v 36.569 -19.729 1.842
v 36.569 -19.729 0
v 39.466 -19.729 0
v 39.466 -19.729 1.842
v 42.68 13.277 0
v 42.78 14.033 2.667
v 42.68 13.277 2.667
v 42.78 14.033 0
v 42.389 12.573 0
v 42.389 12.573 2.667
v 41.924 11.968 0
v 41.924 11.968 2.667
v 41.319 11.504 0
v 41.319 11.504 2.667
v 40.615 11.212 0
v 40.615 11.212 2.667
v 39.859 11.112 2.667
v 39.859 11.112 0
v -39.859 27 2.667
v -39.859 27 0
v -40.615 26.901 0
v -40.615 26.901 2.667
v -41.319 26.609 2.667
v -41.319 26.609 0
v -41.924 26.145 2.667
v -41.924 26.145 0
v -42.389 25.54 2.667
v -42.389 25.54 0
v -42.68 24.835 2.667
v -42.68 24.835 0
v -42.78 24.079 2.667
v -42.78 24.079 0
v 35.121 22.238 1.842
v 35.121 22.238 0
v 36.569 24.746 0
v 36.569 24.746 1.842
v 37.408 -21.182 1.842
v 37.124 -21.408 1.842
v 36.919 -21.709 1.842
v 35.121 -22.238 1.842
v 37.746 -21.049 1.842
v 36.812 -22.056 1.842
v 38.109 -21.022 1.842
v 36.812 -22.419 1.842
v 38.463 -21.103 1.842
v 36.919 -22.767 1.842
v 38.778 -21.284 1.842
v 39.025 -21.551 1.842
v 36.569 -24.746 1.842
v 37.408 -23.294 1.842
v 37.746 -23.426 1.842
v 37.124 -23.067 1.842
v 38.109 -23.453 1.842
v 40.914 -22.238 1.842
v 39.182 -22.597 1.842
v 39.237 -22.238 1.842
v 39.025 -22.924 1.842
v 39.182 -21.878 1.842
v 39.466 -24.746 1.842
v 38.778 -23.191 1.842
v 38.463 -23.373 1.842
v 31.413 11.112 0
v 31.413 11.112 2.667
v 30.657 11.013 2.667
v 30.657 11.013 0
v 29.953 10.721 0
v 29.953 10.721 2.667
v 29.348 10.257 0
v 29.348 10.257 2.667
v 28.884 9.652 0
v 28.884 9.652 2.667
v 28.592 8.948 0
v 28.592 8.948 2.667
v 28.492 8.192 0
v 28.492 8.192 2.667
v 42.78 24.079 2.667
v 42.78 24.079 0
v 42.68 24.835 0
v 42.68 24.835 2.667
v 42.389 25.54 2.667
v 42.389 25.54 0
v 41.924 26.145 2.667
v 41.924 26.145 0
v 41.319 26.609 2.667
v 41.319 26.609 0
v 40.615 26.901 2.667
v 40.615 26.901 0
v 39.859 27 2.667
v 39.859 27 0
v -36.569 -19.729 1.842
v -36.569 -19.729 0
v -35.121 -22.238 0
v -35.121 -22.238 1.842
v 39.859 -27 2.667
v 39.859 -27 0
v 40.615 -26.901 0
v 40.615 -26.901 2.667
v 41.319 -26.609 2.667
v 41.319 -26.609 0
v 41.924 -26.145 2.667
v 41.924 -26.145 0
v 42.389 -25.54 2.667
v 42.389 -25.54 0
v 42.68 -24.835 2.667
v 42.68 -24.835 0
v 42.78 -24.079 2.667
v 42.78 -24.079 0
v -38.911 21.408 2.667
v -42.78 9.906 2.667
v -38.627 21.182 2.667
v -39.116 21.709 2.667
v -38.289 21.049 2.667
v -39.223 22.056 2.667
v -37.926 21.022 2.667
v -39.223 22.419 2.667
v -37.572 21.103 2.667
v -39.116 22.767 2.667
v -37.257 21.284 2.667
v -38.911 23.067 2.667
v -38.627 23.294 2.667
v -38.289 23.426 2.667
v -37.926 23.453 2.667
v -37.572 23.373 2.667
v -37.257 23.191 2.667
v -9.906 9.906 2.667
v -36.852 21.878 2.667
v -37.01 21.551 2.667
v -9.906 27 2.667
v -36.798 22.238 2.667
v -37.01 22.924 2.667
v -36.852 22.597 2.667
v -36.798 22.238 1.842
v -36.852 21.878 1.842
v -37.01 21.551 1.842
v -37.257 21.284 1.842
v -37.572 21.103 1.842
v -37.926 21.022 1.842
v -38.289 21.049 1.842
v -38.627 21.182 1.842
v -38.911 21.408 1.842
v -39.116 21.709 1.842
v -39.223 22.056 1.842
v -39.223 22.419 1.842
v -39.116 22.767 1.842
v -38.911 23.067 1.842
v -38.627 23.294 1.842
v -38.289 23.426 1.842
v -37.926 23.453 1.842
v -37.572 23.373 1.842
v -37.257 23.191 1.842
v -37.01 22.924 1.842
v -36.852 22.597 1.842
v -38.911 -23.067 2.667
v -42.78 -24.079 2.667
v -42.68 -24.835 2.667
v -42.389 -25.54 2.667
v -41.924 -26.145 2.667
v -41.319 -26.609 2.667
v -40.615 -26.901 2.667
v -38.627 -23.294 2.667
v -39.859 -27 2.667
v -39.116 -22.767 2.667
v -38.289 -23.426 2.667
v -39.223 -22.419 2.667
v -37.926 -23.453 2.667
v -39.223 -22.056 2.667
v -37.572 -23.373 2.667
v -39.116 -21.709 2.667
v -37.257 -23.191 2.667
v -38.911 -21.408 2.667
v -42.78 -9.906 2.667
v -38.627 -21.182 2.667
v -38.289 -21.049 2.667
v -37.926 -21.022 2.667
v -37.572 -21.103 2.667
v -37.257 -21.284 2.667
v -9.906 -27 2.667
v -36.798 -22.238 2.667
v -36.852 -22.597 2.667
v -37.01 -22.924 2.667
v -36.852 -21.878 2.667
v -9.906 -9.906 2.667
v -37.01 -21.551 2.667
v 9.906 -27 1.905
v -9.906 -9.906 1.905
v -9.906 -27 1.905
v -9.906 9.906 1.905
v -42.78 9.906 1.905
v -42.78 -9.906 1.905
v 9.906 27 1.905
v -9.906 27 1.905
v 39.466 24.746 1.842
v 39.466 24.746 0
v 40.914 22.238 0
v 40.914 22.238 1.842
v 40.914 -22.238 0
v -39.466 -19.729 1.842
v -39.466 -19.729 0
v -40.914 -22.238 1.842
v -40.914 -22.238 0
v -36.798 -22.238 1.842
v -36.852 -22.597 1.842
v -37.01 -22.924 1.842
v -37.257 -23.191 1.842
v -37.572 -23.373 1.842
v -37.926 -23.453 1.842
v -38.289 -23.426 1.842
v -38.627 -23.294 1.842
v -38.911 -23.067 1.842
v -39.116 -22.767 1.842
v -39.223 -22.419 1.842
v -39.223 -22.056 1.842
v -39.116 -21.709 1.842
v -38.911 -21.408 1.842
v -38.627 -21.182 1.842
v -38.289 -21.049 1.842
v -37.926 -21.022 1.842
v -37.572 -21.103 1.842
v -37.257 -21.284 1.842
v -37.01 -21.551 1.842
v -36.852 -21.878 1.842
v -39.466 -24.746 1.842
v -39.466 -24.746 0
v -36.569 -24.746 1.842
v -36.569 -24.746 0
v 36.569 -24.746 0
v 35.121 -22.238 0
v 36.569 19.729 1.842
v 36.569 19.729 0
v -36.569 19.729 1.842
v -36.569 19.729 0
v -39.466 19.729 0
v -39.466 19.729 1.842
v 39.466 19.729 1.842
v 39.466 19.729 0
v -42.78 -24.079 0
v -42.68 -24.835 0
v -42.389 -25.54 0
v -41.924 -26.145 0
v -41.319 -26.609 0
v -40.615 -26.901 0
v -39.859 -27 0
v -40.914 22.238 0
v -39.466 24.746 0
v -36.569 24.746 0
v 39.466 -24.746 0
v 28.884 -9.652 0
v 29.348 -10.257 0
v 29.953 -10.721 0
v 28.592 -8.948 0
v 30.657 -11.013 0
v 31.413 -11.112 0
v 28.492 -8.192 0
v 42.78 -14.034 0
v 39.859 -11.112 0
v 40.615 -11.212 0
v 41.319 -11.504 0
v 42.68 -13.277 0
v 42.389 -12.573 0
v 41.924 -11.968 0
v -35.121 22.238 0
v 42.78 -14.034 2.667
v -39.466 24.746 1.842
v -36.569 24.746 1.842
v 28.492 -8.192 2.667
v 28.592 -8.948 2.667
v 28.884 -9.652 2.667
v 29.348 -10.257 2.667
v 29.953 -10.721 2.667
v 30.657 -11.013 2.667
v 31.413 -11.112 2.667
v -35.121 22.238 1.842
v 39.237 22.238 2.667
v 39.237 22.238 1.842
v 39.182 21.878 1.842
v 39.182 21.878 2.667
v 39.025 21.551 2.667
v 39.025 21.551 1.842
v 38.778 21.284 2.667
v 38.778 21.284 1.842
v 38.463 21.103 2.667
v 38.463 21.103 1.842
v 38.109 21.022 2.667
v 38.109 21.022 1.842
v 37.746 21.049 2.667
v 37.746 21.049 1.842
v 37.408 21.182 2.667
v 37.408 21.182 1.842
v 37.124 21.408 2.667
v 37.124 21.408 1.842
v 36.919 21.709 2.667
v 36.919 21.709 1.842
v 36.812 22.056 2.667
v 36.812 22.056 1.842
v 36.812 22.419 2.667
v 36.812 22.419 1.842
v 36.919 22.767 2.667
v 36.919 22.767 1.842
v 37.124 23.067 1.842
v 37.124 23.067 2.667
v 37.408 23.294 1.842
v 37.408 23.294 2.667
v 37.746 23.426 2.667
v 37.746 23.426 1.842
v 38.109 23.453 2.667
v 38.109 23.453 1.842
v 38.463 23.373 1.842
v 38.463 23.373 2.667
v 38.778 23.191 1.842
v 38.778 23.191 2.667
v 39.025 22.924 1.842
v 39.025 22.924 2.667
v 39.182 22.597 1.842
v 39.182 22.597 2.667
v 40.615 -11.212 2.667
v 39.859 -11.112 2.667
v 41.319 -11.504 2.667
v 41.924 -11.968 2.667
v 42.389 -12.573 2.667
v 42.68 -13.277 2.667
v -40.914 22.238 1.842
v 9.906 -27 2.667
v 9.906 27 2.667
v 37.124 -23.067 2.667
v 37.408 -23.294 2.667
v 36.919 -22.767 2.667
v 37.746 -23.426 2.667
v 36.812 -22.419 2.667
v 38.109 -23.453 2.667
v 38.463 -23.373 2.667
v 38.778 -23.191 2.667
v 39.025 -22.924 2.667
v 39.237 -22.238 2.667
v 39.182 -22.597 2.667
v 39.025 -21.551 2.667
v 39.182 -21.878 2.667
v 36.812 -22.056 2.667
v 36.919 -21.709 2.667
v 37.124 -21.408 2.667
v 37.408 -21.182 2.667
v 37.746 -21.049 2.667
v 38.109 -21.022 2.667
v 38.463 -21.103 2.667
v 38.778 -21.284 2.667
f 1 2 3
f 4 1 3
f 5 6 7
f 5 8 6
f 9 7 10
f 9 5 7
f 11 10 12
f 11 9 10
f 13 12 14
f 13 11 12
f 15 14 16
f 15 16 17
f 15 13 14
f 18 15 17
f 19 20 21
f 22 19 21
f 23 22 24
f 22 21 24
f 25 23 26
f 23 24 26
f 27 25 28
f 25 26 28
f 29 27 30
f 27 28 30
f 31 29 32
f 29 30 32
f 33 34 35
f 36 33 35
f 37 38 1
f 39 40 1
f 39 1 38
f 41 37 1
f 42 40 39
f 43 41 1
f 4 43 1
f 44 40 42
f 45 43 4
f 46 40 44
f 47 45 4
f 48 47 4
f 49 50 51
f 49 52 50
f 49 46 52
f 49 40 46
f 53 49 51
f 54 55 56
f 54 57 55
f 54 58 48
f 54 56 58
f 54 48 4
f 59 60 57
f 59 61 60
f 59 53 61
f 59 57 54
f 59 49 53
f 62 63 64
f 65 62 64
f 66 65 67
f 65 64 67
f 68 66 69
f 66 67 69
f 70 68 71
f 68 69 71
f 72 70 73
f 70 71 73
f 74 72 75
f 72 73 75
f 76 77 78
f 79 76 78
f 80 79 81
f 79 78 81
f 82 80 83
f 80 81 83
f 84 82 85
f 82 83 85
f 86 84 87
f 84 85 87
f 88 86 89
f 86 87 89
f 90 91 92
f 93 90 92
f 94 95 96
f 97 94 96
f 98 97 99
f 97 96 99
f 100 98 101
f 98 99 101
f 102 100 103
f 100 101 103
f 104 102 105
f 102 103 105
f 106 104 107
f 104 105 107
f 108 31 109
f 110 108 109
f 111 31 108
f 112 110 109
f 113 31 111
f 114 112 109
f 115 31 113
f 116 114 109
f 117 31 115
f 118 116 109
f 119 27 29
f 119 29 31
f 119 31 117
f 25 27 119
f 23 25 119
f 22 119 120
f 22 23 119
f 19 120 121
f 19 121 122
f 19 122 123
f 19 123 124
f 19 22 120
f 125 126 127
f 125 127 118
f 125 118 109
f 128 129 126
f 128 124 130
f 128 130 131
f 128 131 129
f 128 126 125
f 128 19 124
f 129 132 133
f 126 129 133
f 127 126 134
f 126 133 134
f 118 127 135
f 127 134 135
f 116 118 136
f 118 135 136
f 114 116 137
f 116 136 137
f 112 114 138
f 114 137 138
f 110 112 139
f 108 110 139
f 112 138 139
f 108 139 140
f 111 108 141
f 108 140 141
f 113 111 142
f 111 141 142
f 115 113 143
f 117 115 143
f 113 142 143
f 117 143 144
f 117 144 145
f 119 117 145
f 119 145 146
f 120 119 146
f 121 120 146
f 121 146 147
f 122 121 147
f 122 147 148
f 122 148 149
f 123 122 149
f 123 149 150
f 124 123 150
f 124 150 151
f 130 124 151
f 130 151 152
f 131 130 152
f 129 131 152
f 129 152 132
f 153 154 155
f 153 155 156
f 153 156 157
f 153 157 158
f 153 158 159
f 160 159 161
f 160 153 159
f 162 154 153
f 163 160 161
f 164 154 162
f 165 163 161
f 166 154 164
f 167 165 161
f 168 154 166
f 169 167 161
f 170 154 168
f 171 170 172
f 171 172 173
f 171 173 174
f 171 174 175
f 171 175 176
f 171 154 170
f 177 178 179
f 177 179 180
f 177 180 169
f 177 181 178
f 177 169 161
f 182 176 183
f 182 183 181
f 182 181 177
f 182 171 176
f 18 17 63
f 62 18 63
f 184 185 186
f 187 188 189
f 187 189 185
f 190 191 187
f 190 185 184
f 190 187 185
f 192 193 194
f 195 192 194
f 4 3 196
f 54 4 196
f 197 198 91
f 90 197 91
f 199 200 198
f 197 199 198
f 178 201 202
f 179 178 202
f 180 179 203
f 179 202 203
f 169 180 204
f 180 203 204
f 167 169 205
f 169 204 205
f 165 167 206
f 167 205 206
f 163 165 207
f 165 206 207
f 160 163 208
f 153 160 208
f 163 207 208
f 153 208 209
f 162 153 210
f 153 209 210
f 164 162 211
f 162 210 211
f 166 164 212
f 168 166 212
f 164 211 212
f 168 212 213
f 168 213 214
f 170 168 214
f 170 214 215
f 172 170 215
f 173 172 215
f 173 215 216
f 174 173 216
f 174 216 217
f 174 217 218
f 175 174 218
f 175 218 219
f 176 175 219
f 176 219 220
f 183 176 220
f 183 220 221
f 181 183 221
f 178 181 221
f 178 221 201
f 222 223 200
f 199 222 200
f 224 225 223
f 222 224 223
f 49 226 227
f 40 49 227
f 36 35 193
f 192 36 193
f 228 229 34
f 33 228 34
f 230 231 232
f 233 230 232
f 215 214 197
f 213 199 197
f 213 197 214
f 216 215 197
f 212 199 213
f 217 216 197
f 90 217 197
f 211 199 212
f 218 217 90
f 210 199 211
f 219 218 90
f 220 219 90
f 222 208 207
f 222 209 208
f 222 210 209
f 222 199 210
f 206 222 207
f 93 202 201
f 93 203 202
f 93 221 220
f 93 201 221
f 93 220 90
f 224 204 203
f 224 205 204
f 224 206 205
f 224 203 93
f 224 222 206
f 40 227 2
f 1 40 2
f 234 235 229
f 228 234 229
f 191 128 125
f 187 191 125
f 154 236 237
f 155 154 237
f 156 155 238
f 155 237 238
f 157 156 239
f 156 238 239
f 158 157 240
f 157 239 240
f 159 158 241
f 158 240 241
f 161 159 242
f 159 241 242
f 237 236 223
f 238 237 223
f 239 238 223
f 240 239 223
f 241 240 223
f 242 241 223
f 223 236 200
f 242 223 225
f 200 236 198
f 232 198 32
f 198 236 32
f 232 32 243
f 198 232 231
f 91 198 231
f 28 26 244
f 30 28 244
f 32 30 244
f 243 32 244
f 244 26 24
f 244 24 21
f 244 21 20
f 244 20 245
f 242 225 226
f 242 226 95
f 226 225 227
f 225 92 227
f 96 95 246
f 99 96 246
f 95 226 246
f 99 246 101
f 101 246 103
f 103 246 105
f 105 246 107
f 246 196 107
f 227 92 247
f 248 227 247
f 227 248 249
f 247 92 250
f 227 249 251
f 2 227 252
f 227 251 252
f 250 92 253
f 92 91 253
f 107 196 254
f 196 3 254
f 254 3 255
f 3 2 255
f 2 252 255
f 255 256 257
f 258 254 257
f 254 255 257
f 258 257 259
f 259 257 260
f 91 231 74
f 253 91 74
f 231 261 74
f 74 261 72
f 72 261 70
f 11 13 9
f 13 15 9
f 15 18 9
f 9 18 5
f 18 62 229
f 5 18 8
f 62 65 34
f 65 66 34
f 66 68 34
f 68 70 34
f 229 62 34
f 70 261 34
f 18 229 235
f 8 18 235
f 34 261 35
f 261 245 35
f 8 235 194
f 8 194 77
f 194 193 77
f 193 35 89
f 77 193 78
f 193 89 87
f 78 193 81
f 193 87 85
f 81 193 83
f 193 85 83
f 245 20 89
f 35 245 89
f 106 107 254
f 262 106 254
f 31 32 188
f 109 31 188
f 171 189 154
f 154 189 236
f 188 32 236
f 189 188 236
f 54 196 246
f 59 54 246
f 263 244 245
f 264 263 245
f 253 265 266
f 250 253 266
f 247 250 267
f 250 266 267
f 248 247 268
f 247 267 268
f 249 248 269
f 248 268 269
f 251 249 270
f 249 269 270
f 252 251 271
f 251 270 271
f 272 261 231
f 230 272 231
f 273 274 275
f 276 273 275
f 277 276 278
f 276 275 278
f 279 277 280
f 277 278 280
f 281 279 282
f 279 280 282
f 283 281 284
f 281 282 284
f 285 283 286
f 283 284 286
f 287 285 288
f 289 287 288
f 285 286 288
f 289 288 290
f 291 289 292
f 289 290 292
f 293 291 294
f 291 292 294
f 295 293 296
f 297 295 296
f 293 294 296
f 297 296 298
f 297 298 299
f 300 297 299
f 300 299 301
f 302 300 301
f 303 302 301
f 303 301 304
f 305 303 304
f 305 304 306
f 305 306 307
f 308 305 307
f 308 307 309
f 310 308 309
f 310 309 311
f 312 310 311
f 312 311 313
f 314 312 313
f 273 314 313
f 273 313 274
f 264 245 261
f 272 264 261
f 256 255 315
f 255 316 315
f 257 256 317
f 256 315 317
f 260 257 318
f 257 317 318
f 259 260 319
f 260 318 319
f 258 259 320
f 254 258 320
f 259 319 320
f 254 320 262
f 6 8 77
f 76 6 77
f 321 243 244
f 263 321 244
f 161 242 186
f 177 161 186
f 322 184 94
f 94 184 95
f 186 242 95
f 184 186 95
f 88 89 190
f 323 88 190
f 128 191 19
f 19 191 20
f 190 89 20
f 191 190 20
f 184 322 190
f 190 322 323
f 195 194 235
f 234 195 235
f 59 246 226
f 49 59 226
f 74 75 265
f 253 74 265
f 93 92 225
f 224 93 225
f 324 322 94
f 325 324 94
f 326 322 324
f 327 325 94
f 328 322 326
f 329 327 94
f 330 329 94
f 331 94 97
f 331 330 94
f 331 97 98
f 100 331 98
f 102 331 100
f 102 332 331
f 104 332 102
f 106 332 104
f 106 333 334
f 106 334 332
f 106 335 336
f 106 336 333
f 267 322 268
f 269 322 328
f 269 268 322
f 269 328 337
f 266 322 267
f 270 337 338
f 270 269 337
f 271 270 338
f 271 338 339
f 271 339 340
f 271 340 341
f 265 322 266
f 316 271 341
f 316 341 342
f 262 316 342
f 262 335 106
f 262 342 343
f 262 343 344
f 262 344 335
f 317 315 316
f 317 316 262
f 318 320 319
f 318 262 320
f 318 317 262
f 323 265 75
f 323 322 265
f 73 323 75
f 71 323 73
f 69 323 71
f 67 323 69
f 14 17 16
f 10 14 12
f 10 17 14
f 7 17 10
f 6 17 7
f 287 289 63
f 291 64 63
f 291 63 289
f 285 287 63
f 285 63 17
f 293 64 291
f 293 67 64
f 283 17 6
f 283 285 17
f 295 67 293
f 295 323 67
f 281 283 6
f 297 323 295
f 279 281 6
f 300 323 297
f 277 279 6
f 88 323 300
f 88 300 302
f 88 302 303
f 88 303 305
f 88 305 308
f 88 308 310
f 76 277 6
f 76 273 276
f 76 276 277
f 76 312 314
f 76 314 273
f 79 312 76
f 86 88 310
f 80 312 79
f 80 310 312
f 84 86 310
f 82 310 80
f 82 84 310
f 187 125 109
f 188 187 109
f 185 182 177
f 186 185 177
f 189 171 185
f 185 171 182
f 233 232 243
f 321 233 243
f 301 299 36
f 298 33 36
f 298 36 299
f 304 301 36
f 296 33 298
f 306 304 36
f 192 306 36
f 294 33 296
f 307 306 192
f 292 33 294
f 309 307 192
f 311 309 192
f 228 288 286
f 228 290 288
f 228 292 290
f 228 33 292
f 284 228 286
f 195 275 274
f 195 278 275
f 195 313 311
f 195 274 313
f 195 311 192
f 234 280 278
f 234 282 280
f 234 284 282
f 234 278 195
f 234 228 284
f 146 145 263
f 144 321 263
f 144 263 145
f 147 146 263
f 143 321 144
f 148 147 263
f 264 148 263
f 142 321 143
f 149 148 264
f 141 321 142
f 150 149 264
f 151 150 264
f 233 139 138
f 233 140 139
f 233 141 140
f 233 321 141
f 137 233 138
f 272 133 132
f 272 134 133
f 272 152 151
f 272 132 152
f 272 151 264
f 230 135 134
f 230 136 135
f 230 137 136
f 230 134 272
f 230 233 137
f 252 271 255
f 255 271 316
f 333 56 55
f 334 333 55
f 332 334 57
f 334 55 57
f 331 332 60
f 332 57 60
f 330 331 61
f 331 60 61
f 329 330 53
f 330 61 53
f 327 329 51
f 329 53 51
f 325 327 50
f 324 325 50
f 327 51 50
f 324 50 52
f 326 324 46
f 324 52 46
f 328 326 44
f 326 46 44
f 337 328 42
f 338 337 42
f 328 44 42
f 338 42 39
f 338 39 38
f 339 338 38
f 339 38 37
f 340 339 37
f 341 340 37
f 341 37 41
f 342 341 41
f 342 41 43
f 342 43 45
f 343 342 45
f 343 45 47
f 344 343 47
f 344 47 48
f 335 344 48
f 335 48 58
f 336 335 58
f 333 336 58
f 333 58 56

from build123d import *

# Parameters (mm, degrees)
F1_DEPTH = 2.667
F2_R     = 1.2192
F3_DEPTH = 2.668
F5_DEPTH = 1.8415
F7_DEPTH = 0.762
F9_DEPTH = 2.668
F10_R    = 2.921


with BuildPart() as f1:
    # F0 (on Top) → F1 (new body)
    with BuildSketch(Plane.XY):
        with BuildLine():
            Line((39.85895, 27.0002), (-39.85895, 27.0002))
            ThreePointArc((-39.85895, 27.0002), (-41.9244089078, 26.1446589078), (-42.77995, 24.0792))
            Line((-42.77995, 24.0792), (-42.77995, -24.0792))
            ThreePointArc((-42.77995, -24.0792), (-41.9244089078, -26.1446589078), (-39.85895, -27.0002))
            Line((-39.85895, -27.0002), (39.85895, -27.0002))
            ThreePointArc((39.85895, -27.0002), (41.9244089078, -26.1446589078), (42.77995, -24.0792))
            Line((42.77995, -24.0792), (42.77995, 24.0792))
            ThreePointArc((42.77995, 24.0792), (41.9244089078, 26.1446589078), (39.85895, 27.0002))
        make_face()
    extrude(amount=F1_DEPTH)

    # F2 (on face) → F3 (cut, through all)
    with BuildSketch(Plane(origin=(0, 0, 0), x_dir=(1, 0, 0), z_dir=(0, 0, -1))):
        with Locations((-38.01745, 22.2377)):
            Circle(F2_R)
        with Locations((-38.01745, -22.2377)):
            Circle(F2_R)
        with Locations((38.01745, -22.2377)):
            Circle(F2_R)
        with Locations((38.01745, 22.2377)):
            Circle(F2_R)
    extrude(amount=-F3_DEPTH, mode=Mode.SUBTRACT)

    # F4 (on face) → F5 (cut)
    with BuildSketch(Plane(origin=(0, 0, 0), x_dir=(1, 0, 0), z_dir=(0, 0, -1))):
        Polygon((-36.5693111873, 19.72945), (-35.1211723746, 22.2377), (-36.5693111873, 24.74595), (-39.4655888127, 24.74595), (-40.9137276254, 22.2377), (-39.4655888127, 19.72945), align=None)
        Polygon((-35.1211723746, -22.2377), (-36.5693111873, -19.72945), (-39.4655888127, -19.72945), (-40.9137276254, -22.2377), (-39.4655888127, -24.74595), (-36.5693111873, -24.74595), align=None)
        Polygon((35.1211723746, 22.2377), (36.5693111873, 19.72945), (39.4655888127, 19.72945), (40.9137276254, 22.2377), (39.4655888127, 24.74595), (36.5693111873, 24.74595), align=None)
        Polygon((36.5693111873, -19.72945), (35.1211723746, -22.2377), (36.5693111873, -24.74595), (39.4655888127, -24.74595), (40.9137276254, -22.2377), (39.4655888127, -19.72945), align=None)
    extrude(amount=-F5_DEPTH, mode=Mode.SUBTRACT)

    # F6 (on face) → F7 (cut)
    with BuildSketch(Plane.XY.offset(2.667)):
        Polygon((9.906, 27.0002), (-9.906, 27.0002), (-9.906, 9.906), (-42.77995, 9.906), (-42.77995, -9.906), (-9.906, -9.906), (-9.906, -27.0002), (9.906, -27.0002), align=None)
    extrude(amount=-F7_DEPTH, mode=Mode.SUBTRACT)

    # F8 (on face) → F9 (cut, through all)
    with BuildSketch(Plane.XY.offset(2.667)):
        with BuildLine():
            Line((57.06745, 11.1125), (31.41345, 11.1125))
            ThreePointArc((31.41345, 11.1125), (29.3479910922, 10.2569589078), (28.49245, 8.1915))
            Line((28.49245, 8.1915), (28.49245, -8.1915))
            ThreePointArc((28.49245, -8.1915), (29.3479910922, -10.2569589078), (31.41345, -11.1125))
            Line((31.41345, -11.1125), (57.06745, -11.1125))
            Line((57.06745, -11.1125), (57.06745, 11.1125))
        make_face()
    extrude(amount=-F9_DEPTH, mode=Mode.SUBTRACT)

    # F10
    f10_edges = [f1.edges().sort_by_distance(p)[0] for p in [
        (42.77995, 11.1125, 1.3335),
        (42.77995, -11.1125, 1.3335),
    ]]
    fillet(f10_edges, radius=F10_R)


solid = f1.part
